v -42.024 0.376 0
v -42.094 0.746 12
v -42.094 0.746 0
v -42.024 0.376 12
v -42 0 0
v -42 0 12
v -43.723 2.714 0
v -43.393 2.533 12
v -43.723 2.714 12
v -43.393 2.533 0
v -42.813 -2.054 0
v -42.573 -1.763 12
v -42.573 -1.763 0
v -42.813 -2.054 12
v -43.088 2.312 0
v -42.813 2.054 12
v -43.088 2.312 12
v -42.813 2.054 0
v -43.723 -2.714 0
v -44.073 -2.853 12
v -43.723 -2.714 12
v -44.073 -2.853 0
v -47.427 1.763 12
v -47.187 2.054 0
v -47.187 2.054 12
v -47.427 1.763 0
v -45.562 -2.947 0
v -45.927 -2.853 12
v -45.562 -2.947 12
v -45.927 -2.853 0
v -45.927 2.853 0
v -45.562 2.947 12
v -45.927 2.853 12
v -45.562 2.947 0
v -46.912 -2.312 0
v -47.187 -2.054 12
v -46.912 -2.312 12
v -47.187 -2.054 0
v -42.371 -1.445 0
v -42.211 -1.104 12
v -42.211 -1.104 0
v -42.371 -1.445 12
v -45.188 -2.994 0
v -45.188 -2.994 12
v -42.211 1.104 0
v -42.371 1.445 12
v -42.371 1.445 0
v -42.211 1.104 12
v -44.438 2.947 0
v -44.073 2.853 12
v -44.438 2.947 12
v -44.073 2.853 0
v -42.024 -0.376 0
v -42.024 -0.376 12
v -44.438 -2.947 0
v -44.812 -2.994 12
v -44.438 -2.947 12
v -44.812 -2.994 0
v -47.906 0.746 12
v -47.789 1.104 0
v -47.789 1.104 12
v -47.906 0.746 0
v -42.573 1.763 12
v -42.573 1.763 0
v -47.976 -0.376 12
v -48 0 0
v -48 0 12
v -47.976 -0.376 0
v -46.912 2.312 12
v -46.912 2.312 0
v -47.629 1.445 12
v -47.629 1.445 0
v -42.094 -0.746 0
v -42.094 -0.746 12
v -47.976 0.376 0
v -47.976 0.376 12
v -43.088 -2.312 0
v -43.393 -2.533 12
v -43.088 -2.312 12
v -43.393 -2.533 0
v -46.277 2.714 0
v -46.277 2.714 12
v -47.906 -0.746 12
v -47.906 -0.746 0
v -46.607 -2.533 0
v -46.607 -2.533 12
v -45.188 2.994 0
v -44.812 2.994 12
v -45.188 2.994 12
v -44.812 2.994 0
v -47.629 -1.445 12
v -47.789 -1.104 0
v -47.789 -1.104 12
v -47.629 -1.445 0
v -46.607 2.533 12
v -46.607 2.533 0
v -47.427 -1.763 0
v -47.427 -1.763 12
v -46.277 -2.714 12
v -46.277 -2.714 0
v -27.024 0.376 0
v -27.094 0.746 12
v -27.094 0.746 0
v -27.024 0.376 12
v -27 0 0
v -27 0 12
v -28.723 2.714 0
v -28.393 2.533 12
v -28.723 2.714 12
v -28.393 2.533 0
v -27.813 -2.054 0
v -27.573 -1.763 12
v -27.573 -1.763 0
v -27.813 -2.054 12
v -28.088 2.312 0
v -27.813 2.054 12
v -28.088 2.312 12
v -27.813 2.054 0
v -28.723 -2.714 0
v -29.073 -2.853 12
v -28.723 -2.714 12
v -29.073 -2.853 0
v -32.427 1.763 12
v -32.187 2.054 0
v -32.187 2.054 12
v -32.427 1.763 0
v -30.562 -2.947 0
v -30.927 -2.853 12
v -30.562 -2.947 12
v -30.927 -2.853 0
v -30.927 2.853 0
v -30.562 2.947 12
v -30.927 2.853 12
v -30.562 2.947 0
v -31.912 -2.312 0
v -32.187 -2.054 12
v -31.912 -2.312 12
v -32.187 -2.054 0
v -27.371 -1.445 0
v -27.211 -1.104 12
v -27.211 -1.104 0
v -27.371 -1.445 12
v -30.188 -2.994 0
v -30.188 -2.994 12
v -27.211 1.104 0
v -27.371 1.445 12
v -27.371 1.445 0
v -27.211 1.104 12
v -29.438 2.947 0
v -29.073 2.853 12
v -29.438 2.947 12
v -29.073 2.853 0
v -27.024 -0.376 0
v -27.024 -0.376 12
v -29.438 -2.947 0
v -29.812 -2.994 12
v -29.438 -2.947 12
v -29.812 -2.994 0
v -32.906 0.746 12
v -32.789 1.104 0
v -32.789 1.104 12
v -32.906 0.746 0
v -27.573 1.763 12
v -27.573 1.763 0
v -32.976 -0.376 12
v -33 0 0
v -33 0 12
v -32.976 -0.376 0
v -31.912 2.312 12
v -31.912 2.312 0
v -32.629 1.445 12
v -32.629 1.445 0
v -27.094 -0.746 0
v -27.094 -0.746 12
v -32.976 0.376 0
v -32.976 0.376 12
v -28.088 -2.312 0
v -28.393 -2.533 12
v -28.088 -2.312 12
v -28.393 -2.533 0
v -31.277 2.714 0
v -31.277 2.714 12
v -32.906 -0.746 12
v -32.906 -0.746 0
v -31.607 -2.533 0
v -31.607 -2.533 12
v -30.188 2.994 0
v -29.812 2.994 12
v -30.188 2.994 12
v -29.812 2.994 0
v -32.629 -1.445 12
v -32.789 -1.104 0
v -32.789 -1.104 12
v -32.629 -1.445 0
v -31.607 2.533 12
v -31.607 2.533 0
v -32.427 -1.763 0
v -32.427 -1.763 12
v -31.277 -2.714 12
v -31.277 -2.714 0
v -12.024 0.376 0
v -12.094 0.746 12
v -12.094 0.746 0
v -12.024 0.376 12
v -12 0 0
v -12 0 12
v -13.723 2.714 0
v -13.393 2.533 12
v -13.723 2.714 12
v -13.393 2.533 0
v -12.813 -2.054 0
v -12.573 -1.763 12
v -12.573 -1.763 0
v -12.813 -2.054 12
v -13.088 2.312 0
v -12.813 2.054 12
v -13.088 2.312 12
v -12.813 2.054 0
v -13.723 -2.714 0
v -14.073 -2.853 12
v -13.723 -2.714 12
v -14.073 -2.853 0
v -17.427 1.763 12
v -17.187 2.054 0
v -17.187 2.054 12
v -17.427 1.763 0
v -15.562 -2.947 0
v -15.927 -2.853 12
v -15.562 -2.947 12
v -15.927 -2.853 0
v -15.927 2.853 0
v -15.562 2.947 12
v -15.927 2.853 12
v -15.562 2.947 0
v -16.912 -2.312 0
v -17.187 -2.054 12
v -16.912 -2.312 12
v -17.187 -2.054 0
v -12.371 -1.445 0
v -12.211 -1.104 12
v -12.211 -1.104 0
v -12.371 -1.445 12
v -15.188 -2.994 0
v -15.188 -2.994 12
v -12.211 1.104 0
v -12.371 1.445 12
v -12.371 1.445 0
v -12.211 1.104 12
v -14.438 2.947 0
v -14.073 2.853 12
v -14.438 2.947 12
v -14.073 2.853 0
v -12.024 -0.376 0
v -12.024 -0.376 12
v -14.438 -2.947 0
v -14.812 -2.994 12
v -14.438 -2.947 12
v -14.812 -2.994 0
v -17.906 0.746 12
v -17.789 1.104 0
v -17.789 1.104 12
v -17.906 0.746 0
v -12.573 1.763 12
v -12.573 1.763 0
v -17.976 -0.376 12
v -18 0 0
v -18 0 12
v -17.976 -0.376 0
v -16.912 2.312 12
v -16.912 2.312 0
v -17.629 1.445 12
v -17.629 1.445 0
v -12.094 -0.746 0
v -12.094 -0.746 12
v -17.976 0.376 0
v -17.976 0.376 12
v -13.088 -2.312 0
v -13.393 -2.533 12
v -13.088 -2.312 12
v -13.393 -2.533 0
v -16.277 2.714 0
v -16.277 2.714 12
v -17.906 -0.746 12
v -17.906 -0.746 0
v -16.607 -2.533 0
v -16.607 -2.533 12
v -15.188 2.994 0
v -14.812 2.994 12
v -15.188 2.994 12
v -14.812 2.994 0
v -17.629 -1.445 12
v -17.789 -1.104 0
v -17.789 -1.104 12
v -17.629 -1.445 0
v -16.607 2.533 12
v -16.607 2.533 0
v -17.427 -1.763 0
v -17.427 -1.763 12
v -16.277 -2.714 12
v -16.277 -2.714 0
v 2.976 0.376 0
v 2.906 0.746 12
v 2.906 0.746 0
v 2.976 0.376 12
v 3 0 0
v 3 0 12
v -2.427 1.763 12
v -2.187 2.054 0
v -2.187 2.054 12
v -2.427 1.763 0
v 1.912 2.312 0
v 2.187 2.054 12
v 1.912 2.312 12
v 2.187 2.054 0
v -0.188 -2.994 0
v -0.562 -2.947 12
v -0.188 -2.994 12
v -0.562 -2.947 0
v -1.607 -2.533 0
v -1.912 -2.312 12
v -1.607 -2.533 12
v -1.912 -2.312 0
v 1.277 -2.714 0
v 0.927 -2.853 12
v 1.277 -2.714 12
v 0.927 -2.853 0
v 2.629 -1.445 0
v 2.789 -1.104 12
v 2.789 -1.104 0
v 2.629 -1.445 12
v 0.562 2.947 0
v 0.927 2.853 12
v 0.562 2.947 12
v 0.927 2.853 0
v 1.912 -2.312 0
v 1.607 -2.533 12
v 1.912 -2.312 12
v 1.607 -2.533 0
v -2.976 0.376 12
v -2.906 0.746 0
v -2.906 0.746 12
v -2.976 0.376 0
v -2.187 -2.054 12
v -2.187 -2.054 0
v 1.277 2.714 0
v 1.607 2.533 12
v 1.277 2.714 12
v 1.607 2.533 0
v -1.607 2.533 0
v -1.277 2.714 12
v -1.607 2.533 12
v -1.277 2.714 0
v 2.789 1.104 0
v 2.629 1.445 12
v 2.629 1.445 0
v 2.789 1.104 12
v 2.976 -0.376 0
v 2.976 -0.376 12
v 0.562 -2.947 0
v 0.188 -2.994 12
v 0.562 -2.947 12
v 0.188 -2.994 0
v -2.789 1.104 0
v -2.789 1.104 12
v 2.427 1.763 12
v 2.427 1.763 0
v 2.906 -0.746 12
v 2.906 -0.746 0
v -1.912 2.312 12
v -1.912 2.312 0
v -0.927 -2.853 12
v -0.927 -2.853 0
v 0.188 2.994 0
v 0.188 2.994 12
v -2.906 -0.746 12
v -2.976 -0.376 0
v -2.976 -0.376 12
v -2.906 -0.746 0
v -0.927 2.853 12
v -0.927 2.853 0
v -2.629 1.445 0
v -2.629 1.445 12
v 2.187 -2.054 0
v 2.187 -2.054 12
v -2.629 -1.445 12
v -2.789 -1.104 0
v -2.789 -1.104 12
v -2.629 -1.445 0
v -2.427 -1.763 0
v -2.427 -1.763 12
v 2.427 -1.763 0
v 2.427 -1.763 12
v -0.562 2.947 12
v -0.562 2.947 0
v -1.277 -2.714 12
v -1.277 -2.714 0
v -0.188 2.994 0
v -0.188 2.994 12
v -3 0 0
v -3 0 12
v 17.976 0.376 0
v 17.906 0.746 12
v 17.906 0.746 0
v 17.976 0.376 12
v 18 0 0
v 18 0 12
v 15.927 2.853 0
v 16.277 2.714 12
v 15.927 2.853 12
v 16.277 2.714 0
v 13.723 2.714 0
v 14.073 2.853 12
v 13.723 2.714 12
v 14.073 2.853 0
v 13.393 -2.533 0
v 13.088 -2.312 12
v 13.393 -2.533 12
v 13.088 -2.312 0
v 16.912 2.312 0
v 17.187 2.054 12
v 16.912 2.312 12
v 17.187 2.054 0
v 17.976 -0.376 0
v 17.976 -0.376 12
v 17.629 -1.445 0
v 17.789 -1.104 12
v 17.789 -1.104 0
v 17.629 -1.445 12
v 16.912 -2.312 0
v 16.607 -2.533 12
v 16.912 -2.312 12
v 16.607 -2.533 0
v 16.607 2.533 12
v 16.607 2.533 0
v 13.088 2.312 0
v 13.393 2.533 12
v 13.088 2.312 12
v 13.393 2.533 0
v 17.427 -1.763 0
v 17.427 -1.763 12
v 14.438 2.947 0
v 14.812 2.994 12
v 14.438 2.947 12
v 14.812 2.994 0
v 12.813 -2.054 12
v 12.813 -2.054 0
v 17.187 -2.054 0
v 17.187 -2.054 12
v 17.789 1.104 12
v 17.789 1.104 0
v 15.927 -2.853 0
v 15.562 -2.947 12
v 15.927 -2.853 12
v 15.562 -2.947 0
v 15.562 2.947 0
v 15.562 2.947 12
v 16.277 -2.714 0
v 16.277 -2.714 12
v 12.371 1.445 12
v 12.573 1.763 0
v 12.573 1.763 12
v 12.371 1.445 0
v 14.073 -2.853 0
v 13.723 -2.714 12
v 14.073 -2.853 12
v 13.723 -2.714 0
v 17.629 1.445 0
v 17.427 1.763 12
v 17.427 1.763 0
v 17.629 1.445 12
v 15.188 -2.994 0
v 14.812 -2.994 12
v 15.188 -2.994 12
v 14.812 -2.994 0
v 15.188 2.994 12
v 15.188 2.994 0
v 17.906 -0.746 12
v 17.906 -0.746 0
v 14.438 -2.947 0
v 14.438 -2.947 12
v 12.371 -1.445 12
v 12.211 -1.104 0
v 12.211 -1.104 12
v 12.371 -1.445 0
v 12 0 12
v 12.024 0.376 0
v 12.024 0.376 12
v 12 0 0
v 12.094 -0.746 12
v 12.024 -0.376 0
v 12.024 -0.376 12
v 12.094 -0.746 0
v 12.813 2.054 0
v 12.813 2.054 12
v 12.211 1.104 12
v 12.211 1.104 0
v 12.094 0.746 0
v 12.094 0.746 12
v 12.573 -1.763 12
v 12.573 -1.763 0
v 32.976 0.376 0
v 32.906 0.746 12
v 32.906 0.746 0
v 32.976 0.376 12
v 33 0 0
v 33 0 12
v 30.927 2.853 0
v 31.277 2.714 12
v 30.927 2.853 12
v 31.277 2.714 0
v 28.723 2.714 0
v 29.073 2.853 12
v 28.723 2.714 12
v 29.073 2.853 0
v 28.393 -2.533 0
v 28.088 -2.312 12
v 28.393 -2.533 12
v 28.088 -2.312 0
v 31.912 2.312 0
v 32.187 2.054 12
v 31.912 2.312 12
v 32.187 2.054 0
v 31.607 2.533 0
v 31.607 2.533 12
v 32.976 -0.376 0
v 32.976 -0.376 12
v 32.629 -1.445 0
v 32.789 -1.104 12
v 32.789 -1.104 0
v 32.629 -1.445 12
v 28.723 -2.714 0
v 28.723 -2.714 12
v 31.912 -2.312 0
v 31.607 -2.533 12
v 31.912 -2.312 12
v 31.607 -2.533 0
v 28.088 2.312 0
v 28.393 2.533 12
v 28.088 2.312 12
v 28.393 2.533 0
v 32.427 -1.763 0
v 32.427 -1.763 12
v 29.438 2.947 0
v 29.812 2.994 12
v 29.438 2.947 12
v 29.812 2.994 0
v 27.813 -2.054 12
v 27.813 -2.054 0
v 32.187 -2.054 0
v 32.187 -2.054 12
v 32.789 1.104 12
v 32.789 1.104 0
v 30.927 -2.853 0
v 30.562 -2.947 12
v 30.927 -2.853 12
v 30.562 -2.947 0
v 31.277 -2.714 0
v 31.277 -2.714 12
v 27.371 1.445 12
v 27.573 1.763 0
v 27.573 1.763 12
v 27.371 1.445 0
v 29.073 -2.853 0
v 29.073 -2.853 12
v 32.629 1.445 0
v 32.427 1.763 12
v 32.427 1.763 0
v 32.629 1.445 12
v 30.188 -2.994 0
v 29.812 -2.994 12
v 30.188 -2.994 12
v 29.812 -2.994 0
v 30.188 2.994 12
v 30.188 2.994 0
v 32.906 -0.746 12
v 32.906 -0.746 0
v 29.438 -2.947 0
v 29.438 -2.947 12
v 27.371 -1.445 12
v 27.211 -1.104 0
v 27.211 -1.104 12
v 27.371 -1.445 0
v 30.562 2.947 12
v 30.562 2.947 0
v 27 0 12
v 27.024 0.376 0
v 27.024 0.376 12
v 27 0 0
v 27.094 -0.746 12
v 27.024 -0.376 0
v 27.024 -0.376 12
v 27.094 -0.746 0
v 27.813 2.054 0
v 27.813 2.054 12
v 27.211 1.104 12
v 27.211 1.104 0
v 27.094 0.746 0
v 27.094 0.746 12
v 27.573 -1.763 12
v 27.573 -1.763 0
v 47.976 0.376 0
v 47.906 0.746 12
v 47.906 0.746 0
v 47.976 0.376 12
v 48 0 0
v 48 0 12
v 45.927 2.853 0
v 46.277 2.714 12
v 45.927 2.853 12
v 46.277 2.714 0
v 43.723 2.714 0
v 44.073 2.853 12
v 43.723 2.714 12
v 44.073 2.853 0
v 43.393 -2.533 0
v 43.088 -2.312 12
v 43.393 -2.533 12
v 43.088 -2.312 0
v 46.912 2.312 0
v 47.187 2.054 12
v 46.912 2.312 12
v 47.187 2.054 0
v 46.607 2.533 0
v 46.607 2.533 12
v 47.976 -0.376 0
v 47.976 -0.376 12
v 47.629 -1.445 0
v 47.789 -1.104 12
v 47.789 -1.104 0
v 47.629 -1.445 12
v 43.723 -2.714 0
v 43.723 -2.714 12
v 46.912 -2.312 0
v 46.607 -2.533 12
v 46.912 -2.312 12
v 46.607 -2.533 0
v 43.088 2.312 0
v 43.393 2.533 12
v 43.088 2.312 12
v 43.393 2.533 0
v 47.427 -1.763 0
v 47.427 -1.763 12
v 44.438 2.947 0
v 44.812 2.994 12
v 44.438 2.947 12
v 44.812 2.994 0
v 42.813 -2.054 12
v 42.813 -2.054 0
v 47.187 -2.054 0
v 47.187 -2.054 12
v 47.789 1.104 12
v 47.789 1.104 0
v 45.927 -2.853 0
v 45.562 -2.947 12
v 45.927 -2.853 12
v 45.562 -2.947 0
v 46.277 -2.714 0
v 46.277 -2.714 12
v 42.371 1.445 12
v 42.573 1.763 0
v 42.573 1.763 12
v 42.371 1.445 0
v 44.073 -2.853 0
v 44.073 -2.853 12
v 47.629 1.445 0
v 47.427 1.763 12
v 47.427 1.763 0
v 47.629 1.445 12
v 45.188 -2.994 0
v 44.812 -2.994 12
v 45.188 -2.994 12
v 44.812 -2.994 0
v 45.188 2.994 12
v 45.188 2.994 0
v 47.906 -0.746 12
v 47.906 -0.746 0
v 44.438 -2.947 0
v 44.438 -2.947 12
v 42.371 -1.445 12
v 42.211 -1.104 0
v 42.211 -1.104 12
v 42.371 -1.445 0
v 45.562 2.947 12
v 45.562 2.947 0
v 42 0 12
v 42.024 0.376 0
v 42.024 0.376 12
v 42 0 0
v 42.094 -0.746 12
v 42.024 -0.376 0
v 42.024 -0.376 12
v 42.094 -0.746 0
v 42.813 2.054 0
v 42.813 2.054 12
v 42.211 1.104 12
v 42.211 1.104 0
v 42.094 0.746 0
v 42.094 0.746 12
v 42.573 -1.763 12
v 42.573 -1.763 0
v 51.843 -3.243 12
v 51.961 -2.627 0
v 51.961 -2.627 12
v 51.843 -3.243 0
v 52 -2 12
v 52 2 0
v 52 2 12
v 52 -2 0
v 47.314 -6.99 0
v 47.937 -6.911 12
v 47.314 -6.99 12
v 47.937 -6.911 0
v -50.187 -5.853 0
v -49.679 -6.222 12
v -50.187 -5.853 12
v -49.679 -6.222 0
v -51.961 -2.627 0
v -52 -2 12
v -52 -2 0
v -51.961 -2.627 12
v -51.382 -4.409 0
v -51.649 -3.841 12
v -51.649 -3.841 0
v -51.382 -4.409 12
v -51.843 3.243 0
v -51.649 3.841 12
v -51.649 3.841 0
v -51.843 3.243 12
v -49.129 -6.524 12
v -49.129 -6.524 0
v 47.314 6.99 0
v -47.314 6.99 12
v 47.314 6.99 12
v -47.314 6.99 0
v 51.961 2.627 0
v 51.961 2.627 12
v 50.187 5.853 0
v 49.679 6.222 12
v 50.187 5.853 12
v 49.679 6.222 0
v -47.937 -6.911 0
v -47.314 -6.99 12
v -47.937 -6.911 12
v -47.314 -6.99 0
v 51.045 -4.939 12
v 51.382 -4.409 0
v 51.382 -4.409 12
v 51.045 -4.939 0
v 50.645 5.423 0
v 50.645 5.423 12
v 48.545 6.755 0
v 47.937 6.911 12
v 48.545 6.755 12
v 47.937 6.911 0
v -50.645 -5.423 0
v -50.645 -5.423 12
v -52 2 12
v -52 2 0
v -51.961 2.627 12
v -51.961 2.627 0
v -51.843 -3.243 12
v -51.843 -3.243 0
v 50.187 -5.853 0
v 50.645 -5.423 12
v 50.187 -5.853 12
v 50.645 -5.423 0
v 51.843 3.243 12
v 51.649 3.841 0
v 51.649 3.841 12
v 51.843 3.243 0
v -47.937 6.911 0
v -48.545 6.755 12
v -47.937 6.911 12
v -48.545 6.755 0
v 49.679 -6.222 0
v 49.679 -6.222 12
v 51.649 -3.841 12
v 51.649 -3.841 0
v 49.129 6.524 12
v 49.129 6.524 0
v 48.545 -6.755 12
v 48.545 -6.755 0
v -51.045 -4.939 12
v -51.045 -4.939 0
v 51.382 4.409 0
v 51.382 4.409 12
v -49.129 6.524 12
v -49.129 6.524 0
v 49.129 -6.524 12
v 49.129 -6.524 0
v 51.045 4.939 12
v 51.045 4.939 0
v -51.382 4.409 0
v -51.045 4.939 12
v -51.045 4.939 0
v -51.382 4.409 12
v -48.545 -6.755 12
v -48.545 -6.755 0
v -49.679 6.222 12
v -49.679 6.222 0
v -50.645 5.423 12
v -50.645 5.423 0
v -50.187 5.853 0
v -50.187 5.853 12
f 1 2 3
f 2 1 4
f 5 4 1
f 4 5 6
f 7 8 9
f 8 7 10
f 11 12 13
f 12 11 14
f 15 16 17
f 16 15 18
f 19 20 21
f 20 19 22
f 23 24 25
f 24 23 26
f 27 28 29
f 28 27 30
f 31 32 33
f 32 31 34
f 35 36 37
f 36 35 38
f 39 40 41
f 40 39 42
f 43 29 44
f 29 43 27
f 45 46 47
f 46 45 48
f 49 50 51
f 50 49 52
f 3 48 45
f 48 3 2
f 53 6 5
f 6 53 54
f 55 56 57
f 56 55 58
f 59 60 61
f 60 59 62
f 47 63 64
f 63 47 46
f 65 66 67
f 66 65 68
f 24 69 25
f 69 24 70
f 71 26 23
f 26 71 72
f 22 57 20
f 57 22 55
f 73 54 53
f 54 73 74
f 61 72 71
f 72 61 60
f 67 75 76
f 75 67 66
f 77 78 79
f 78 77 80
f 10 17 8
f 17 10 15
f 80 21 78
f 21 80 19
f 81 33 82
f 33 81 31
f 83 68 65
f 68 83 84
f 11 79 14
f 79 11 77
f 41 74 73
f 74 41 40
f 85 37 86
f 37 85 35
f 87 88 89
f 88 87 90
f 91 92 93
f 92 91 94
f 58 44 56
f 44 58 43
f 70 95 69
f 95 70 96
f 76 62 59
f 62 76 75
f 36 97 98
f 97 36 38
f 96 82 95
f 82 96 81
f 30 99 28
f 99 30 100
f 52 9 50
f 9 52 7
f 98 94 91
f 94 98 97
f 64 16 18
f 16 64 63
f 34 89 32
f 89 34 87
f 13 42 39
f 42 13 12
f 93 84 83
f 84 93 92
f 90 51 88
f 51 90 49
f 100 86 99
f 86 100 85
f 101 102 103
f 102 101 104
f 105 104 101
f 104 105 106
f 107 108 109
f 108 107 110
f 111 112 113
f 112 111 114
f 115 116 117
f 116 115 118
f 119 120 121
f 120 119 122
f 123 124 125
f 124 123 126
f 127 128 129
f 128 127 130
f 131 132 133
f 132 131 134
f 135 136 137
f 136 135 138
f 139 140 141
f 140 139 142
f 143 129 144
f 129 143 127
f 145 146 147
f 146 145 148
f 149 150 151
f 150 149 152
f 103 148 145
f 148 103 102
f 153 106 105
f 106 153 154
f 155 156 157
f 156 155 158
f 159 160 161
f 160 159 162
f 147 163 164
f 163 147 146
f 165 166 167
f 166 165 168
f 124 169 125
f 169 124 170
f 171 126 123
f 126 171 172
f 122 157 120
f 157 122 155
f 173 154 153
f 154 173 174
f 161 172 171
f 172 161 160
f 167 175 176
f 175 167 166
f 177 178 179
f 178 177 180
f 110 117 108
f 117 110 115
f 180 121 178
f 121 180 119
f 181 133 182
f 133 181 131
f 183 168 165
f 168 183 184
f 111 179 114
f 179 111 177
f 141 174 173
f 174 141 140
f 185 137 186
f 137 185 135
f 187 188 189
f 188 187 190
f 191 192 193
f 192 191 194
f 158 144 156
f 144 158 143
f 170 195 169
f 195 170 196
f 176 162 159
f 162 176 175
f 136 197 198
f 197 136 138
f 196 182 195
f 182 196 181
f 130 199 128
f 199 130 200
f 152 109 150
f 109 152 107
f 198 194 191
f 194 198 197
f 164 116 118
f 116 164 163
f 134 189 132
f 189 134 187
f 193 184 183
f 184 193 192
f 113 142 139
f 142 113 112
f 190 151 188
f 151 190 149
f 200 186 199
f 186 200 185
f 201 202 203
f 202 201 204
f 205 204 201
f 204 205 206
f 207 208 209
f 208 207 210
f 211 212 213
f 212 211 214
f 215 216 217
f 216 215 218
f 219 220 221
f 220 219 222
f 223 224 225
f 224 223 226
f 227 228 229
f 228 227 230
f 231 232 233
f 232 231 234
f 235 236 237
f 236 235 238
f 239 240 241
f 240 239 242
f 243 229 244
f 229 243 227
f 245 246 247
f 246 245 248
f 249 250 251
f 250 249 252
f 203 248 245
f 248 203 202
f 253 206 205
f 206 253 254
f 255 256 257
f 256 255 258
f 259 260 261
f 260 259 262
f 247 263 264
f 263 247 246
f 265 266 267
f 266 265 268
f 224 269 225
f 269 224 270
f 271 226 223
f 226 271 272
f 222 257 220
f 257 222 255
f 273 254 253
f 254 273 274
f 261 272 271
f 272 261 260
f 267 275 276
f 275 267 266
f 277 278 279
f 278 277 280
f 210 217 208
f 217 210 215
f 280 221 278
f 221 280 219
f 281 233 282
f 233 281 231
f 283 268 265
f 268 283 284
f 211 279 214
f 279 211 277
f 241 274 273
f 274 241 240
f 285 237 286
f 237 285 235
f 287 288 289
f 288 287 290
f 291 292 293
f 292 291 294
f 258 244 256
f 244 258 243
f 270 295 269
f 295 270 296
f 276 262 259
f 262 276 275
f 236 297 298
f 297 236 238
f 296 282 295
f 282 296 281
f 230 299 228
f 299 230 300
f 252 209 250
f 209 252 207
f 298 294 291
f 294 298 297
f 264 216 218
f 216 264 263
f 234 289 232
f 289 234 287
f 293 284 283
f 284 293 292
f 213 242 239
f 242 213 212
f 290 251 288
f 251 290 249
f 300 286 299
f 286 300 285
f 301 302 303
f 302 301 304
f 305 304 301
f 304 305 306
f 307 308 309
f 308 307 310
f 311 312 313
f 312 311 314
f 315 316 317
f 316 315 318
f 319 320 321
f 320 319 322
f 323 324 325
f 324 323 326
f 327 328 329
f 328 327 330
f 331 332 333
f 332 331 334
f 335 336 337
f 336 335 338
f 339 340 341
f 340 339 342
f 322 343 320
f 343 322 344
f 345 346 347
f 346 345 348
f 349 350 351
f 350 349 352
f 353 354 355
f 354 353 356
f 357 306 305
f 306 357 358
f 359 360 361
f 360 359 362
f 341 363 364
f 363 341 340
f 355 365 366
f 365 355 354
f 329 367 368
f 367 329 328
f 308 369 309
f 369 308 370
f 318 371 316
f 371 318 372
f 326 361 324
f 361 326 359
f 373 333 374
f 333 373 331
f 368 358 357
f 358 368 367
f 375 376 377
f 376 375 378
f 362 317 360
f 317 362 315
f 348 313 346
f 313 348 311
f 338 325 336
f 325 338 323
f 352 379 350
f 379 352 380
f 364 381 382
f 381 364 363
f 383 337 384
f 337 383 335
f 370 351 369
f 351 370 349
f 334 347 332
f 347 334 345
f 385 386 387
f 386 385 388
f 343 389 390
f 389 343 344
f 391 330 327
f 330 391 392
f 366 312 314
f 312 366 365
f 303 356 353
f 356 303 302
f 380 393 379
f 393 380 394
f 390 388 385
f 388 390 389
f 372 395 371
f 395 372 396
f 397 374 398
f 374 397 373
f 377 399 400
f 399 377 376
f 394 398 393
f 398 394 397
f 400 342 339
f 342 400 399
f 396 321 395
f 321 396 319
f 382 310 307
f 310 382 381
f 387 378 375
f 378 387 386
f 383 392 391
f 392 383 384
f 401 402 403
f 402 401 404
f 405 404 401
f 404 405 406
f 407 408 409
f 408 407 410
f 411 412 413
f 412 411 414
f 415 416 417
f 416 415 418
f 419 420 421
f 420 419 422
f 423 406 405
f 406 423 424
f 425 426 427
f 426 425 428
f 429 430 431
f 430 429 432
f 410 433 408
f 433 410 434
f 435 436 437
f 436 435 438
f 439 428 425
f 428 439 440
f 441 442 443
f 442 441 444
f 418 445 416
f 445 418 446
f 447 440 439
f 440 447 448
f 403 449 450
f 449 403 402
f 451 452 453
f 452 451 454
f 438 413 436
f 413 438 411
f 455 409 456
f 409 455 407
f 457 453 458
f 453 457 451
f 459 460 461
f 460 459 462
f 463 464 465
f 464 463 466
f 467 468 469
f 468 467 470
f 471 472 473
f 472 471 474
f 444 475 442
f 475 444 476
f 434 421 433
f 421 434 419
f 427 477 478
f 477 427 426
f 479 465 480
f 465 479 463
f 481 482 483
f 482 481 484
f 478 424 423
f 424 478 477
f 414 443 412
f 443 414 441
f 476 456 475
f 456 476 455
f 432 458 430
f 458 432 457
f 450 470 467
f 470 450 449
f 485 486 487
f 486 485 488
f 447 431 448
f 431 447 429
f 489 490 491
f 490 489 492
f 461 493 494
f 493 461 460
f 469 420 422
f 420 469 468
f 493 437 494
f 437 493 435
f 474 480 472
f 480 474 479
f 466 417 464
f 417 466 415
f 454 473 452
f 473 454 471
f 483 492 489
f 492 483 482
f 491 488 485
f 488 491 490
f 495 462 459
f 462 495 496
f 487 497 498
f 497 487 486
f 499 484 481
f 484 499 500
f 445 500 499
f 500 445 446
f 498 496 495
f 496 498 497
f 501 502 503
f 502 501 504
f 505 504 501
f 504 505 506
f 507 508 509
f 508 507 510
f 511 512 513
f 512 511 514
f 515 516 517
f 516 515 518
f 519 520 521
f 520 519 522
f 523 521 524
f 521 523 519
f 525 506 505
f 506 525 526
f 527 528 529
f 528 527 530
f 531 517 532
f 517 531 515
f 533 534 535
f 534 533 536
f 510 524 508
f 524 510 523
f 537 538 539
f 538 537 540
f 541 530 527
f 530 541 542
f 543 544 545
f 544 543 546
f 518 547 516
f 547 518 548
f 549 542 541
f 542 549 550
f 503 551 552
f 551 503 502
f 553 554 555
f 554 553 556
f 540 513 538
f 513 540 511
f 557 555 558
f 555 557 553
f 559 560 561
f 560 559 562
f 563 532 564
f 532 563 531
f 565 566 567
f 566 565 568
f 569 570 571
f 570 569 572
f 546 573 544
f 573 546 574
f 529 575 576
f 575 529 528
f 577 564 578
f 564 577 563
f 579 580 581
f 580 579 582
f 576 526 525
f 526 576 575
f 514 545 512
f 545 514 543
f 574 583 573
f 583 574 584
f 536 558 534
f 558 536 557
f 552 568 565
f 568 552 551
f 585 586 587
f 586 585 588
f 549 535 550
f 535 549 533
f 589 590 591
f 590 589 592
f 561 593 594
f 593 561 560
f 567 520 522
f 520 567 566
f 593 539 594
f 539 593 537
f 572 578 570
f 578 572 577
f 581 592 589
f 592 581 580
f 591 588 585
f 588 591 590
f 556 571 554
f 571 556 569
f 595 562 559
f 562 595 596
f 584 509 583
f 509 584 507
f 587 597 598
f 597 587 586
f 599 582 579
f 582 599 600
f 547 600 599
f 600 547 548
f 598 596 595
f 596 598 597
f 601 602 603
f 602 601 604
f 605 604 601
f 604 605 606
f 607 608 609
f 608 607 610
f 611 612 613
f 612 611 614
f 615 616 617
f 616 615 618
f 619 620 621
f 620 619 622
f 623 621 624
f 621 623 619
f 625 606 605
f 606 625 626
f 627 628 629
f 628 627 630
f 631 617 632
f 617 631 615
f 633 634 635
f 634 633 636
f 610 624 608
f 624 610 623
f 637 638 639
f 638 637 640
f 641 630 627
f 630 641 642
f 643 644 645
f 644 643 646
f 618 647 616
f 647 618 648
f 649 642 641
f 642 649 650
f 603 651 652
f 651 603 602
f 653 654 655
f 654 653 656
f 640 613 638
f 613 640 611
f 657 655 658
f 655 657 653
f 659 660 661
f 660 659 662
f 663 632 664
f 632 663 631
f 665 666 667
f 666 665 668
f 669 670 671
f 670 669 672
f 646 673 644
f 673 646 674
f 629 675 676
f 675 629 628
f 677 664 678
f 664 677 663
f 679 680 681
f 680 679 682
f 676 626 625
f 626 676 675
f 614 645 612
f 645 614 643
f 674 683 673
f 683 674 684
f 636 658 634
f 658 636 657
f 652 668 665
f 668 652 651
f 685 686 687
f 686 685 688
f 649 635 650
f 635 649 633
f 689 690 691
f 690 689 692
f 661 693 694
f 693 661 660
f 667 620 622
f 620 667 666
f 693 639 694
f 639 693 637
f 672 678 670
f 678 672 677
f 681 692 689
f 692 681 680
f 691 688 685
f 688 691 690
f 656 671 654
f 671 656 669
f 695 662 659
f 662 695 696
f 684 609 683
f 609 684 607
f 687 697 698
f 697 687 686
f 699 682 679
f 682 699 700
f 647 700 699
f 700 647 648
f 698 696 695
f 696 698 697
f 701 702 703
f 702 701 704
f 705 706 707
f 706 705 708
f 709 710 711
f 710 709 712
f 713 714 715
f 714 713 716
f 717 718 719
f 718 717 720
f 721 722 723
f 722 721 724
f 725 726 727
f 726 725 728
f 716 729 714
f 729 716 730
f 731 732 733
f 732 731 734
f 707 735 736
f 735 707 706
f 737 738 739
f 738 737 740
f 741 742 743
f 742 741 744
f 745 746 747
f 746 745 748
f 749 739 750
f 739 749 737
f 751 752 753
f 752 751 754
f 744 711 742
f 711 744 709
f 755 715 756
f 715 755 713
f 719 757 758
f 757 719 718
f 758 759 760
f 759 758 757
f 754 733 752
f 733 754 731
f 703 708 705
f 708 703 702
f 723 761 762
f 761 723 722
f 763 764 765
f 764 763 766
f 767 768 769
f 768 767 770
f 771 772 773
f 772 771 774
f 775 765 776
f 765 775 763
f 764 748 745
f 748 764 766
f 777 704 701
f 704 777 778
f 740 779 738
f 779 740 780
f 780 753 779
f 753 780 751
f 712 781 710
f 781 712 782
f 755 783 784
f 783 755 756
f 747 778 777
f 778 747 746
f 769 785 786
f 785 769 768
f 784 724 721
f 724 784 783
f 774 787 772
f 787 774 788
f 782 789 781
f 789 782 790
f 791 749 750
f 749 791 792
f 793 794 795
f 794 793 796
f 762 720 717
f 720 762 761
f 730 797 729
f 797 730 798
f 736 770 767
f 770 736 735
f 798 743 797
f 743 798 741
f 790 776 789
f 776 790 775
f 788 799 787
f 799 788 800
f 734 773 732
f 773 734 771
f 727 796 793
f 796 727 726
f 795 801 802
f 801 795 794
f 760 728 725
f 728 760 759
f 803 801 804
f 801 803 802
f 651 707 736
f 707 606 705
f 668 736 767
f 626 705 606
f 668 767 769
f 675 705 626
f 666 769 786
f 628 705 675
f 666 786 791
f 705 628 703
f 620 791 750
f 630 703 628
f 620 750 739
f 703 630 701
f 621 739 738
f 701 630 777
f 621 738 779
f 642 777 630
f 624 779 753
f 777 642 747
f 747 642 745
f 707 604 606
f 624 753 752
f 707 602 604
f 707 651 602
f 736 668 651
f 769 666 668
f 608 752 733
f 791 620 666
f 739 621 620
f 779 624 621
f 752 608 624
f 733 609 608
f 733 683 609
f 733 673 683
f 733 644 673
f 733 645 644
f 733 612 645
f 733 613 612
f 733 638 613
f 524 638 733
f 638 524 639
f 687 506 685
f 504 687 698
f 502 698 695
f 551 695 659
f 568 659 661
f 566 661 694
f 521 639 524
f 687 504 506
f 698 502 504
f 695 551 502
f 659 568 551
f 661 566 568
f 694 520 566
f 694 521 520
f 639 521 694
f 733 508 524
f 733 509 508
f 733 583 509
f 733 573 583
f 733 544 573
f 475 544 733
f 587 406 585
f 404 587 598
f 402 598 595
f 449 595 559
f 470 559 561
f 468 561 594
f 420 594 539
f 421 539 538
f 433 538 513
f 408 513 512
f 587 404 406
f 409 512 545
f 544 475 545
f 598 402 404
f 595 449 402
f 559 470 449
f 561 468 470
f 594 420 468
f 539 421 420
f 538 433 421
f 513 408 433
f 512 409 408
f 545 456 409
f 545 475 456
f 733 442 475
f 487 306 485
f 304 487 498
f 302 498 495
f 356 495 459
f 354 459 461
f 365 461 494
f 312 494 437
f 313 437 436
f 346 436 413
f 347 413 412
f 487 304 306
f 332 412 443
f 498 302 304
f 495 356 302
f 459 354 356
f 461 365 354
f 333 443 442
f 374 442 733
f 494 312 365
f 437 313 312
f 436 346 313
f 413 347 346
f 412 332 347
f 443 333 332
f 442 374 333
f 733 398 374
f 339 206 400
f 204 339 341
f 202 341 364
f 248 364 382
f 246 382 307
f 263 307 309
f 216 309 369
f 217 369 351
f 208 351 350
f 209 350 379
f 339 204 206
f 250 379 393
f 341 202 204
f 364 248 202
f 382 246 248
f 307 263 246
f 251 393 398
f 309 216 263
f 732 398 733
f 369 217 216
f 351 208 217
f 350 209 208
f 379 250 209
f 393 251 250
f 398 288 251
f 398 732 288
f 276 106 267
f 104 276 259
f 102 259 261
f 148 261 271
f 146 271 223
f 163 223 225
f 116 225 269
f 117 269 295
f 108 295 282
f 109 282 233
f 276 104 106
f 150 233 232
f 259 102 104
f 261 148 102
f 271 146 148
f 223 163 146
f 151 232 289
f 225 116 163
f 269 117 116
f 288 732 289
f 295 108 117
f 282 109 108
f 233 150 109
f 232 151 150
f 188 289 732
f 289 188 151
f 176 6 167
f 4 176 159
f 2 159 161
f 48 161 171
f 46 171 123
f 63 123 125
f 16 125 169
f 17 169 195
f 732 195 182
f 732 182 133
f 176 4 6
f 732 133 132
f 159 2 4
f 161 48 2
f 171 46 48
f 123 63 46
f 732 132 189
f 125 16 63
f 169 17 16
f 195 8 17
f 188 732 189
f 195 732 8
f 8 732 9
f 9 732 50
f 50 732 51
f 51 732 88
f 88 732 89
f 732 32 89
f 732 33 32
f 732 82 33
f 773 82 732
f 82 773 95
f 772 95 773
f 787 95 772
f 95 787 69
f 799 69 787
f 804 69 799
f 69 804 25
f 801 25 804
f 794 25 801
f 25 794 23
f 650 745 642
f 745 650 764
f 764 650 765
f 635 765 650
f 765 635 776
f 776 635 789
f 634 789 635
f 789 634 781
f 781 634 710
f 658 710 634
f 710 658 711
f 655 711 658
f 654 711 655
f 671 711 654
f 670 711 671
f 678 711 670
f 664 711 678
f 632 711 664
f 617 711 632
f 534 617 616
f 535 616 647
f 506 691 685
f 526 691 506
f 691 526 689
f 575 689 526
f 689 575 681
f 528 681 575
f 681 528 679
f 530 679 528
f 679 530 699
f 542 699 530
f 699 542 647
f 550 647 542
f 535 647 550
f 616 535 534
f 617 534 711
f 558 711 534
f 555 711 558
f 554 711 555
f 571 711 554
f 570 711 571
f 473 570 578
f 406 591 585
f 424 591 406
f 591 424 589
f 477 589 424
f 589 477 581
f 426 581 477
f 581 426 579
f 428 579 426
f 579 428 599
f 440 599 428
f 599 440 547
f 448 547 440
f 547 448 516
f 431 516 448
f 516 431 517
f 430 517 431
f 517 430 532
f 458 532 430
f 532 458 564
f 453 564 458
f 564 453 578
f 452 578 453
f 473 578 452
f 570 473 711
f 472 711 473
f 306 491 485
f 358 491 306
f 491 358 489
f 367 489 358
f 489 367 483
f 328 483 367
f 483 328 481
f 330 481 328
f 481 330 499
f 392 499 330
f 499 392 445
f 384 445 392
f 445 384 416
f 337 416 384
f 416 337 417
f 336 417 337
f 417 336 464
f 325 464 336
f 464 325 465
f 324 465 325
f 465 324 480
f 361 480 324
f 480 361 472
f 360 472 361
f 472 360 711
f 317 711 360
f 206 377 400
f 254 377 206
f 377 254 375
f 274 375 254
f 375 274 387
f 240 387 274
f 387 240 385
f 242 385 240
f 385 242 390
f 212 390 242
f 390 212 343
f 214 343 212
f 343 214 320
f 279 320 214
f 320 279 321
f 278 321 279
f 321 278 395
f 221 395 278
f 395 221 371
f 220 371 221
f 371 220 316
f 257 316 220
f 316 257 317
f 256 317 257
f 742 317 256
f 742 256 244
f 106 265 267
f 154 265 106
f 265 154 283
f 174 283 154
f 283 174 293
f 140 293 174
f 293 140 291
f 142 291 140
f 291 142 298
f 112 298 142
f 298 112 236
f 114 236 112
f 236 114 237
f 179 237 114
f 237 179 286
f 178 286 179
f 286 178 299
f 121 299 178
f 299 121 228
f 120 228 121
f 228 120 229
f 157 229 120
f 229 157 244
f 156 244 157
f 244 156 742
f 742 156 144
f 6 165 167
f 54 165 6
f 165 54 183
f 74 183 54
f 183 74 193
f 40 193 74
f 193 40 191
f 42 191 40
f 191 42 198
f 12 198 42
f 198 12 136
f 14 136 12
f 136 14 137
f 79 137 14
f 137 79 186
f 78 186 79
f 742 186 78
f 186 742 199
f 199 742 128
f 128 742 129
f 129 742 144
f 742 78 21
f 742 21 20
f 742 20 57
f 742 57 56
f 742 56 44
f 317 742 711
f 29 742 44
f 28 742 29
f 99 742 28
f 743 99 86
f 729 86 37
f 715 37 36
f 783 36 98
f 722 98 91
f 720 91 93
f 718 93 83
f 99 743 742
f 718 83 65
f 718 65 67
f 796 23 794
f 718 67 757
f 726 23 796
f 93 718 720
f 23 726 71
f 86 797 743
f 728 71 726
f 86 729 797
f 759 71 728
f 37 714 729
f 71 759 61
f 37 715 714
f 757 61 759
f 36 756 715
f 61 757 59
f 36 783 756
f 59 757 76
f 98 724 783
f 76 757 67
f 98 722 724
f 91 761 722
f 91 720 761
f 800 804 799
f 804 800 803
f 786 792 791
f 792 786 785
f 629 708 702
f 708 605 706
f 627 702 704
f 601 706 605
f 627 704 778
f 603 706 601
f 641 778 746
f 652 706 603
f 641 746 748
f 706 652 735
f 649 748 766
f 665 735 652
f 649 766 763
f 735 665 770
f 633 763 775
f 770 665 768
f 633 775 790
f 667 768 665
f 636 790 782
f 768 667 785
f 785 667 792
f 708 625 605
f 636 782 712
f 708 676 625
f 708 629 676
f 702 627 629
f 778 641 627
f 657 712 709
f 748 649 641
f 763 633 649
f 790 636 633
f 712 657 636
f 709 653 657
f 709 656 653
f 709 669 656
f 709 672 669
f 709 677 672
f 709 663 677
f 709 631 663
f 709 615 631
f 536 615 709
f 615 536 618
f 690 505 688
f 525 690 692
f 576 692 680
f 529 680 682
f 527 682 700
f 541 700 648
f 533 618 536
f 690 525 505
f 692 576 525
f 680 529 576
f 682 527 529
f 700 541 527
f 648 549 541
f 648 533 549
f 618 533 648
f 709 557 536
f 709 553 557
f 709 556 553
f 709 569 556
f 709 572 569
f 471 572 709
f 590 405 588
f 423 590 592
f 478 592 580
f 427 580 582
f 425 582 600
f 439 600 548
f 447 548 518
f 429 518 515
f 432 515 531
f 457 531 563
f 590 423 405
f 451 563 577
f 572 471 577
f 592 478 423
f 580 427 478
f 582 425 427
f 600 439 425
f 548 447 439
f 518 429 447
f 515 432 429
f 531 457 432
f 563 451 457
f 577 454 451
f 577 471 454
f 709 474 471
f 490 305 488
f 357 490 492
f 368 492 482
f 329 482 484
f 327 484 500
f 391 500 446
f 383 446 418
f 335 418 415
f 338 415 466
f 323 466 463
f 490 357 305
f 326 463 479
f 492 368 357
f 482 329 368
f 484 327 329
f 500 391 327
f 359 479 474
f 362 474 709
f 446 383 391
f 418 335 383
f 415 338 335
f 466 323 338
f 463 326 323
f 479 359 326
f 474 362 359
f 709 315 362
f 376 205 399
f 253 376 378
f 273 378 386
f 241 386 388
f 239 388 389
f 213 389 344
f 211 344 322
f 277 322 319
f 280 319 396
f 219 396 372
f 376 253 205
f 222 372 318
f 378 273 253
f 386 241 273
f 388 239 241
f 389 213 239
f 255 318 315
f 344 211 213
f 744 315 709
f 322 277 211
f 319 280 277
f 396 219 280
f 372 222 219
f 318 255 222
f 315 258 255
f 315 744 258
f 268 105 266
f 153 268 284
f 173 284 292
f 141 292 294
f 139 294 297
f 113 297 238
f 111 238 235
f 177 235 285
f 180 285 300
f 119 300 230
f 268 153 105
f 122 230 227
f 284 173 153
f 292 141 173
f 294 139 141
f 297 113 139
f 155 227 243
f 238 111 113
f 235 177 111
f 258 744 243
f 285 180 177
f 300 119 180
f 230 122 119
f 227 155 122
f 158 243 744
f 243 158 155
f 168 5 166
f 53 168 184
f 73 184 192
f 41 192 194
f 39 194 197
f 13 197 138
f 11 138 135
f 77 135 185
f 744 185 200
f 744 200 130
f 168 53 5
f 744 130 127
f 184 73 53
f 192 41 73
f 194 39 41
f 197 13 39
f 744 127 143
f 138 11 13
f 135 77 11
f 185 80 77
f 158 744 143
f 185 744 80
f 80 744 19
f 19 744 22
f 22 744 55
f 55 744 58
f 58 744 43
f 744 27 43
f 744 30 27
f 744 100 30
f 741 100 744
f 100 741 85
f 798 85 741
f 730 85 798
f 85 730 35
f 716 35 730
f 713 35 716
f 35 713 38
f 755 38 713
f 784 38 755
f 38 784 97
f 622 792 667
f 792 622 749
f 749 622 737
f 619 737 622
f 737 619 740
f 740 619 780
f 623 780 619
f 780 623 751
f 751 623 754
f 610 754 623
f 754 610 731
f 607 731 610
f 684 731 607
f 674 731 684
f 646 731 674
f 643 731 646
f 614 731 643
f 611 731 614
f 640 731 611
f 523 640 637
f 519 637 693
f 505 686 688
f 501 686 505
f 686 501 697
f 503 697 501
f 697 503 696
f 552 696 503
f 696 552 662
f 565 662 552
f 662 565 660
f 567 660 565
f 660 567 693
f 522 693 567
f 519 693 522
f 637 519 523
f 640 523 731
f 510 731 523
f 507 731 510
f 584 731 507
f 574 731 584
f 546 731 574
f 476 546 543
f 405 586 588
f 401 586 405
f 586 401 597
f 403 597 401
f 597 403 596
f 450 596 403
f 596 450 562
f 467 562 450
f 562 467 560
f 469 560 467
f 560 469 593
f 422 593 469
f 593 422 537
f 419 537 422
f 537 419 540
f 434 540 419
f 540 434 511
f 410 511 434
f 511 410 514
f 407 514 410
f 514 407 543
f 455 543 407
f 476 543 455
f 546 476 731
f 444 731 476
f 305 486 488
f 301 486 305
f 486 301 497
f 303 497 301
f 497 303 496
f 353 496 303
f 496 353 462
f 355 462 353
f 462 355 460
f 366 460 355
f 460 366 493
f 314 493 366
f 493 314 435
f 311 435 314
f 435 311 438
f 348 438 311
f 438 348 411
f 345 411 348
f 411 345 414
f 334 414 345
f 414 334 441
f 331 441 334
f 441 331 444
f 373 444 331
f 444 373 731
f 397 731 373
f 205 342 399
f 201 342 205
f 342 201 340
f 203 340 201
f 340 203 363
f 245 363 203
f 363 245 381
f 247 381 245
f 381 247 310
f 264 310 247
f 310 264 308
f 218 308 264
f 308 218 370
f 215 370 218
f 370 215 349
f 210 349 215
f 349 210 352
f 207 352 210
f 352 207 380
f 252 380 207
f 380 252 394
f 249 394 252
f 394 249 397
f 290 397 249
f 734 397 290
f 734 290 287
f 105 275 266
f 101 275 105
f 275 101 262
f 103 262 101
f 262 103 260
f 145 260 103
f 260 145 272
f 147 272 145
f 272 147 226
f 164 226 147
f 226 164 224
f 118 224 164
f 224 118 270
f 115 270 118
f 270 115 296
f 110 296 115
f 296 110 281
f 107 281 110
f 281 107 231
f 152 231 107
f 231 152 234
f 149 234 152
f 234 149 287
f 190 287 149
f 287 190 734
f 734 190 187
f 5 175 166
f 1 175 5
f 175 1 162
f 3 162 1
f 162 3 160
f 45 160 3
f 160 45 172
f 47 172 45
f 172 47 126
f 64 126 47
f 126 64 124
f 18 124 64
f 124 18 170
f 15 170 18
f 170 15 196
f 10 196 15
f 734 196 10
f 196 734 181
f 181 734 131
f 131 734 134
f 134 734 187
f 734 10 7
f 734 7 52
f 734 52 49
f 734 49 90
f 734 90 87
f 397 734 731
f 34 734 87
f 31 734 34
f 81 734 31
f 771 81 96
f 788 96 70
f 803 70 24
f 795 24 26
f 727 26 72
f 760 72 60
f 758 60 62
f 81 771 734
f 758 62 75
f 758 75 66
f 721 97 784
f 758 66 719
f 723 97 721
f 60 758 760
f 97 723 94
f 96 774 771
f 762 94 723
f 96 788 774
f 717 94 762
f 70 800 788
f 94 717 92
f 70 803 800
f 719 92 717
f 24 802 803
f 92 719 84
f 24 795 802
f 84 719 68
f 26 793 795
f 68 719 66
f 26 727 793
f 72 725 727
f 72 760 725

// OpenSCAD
$fn = 50;


difference() {
	union() {
		hull() {
			translate(v = [-47.0000000000, 2.0000000000, 0]) {
				cylinder(h = 12, r = 5);
			}
			translate(v = [47.0000000000, 2.0000000000, 0]) {
				cylinder(h = 12, r = 5);
			}
			translate(v = [-47.0000000000, -2.0000000000, 0]) {
				cylinder(h = 12, r = 5);
			}
			translate(v = [47.0000000000, -2.0000000000, 0]) {
				cylinder(h = 12, r = 5);
			}
		}
	}
	union() {
		translate(v = [-45.0000000000, 0.0000000000, 0]) {
			translate(v = [0, 0, -100]) {
				cylinder(h = 200, r = 3.0000000000);
			}
		}
		translate(v = [-30.0000000000, 0.0000000000, 0]) {
			translate(v = [0, 0, -100]) {
				cylinder(h = 200, r = 3.0000000000);
			}
		}
		translate(v = [-15.0000000000, 0.0000000000, 0]) {
			translate(v = [0, 0, -100]) {
				cylinder(h = 200, r = 3.0000000000);
			}
		}
		translate(v = [0, 0, -100]) {
			cylinder(h = 200, r = 3.0000000000);
		}
		translate(v = [15.0000000000, 0.0000000000, 0]) {
			translate(v = [0, 0, -100]) {
				cylinder(h = 200, r = 3.0000000000);
			}
		}
		translate(v = [30.0000000000, 0.0000000000, 0]) {
			translate(v = [0, 0, -100]) {
				cylinder(h = 200, r = 3.0000000000);
			}
		}
		translate(v = [45.0000000000, 0.0000000000, 0]) {
			translate(v = [0, 0, -100]) {
				cylinder(h = 200, r = 3.0000000000);
			}
		}
	}
}
